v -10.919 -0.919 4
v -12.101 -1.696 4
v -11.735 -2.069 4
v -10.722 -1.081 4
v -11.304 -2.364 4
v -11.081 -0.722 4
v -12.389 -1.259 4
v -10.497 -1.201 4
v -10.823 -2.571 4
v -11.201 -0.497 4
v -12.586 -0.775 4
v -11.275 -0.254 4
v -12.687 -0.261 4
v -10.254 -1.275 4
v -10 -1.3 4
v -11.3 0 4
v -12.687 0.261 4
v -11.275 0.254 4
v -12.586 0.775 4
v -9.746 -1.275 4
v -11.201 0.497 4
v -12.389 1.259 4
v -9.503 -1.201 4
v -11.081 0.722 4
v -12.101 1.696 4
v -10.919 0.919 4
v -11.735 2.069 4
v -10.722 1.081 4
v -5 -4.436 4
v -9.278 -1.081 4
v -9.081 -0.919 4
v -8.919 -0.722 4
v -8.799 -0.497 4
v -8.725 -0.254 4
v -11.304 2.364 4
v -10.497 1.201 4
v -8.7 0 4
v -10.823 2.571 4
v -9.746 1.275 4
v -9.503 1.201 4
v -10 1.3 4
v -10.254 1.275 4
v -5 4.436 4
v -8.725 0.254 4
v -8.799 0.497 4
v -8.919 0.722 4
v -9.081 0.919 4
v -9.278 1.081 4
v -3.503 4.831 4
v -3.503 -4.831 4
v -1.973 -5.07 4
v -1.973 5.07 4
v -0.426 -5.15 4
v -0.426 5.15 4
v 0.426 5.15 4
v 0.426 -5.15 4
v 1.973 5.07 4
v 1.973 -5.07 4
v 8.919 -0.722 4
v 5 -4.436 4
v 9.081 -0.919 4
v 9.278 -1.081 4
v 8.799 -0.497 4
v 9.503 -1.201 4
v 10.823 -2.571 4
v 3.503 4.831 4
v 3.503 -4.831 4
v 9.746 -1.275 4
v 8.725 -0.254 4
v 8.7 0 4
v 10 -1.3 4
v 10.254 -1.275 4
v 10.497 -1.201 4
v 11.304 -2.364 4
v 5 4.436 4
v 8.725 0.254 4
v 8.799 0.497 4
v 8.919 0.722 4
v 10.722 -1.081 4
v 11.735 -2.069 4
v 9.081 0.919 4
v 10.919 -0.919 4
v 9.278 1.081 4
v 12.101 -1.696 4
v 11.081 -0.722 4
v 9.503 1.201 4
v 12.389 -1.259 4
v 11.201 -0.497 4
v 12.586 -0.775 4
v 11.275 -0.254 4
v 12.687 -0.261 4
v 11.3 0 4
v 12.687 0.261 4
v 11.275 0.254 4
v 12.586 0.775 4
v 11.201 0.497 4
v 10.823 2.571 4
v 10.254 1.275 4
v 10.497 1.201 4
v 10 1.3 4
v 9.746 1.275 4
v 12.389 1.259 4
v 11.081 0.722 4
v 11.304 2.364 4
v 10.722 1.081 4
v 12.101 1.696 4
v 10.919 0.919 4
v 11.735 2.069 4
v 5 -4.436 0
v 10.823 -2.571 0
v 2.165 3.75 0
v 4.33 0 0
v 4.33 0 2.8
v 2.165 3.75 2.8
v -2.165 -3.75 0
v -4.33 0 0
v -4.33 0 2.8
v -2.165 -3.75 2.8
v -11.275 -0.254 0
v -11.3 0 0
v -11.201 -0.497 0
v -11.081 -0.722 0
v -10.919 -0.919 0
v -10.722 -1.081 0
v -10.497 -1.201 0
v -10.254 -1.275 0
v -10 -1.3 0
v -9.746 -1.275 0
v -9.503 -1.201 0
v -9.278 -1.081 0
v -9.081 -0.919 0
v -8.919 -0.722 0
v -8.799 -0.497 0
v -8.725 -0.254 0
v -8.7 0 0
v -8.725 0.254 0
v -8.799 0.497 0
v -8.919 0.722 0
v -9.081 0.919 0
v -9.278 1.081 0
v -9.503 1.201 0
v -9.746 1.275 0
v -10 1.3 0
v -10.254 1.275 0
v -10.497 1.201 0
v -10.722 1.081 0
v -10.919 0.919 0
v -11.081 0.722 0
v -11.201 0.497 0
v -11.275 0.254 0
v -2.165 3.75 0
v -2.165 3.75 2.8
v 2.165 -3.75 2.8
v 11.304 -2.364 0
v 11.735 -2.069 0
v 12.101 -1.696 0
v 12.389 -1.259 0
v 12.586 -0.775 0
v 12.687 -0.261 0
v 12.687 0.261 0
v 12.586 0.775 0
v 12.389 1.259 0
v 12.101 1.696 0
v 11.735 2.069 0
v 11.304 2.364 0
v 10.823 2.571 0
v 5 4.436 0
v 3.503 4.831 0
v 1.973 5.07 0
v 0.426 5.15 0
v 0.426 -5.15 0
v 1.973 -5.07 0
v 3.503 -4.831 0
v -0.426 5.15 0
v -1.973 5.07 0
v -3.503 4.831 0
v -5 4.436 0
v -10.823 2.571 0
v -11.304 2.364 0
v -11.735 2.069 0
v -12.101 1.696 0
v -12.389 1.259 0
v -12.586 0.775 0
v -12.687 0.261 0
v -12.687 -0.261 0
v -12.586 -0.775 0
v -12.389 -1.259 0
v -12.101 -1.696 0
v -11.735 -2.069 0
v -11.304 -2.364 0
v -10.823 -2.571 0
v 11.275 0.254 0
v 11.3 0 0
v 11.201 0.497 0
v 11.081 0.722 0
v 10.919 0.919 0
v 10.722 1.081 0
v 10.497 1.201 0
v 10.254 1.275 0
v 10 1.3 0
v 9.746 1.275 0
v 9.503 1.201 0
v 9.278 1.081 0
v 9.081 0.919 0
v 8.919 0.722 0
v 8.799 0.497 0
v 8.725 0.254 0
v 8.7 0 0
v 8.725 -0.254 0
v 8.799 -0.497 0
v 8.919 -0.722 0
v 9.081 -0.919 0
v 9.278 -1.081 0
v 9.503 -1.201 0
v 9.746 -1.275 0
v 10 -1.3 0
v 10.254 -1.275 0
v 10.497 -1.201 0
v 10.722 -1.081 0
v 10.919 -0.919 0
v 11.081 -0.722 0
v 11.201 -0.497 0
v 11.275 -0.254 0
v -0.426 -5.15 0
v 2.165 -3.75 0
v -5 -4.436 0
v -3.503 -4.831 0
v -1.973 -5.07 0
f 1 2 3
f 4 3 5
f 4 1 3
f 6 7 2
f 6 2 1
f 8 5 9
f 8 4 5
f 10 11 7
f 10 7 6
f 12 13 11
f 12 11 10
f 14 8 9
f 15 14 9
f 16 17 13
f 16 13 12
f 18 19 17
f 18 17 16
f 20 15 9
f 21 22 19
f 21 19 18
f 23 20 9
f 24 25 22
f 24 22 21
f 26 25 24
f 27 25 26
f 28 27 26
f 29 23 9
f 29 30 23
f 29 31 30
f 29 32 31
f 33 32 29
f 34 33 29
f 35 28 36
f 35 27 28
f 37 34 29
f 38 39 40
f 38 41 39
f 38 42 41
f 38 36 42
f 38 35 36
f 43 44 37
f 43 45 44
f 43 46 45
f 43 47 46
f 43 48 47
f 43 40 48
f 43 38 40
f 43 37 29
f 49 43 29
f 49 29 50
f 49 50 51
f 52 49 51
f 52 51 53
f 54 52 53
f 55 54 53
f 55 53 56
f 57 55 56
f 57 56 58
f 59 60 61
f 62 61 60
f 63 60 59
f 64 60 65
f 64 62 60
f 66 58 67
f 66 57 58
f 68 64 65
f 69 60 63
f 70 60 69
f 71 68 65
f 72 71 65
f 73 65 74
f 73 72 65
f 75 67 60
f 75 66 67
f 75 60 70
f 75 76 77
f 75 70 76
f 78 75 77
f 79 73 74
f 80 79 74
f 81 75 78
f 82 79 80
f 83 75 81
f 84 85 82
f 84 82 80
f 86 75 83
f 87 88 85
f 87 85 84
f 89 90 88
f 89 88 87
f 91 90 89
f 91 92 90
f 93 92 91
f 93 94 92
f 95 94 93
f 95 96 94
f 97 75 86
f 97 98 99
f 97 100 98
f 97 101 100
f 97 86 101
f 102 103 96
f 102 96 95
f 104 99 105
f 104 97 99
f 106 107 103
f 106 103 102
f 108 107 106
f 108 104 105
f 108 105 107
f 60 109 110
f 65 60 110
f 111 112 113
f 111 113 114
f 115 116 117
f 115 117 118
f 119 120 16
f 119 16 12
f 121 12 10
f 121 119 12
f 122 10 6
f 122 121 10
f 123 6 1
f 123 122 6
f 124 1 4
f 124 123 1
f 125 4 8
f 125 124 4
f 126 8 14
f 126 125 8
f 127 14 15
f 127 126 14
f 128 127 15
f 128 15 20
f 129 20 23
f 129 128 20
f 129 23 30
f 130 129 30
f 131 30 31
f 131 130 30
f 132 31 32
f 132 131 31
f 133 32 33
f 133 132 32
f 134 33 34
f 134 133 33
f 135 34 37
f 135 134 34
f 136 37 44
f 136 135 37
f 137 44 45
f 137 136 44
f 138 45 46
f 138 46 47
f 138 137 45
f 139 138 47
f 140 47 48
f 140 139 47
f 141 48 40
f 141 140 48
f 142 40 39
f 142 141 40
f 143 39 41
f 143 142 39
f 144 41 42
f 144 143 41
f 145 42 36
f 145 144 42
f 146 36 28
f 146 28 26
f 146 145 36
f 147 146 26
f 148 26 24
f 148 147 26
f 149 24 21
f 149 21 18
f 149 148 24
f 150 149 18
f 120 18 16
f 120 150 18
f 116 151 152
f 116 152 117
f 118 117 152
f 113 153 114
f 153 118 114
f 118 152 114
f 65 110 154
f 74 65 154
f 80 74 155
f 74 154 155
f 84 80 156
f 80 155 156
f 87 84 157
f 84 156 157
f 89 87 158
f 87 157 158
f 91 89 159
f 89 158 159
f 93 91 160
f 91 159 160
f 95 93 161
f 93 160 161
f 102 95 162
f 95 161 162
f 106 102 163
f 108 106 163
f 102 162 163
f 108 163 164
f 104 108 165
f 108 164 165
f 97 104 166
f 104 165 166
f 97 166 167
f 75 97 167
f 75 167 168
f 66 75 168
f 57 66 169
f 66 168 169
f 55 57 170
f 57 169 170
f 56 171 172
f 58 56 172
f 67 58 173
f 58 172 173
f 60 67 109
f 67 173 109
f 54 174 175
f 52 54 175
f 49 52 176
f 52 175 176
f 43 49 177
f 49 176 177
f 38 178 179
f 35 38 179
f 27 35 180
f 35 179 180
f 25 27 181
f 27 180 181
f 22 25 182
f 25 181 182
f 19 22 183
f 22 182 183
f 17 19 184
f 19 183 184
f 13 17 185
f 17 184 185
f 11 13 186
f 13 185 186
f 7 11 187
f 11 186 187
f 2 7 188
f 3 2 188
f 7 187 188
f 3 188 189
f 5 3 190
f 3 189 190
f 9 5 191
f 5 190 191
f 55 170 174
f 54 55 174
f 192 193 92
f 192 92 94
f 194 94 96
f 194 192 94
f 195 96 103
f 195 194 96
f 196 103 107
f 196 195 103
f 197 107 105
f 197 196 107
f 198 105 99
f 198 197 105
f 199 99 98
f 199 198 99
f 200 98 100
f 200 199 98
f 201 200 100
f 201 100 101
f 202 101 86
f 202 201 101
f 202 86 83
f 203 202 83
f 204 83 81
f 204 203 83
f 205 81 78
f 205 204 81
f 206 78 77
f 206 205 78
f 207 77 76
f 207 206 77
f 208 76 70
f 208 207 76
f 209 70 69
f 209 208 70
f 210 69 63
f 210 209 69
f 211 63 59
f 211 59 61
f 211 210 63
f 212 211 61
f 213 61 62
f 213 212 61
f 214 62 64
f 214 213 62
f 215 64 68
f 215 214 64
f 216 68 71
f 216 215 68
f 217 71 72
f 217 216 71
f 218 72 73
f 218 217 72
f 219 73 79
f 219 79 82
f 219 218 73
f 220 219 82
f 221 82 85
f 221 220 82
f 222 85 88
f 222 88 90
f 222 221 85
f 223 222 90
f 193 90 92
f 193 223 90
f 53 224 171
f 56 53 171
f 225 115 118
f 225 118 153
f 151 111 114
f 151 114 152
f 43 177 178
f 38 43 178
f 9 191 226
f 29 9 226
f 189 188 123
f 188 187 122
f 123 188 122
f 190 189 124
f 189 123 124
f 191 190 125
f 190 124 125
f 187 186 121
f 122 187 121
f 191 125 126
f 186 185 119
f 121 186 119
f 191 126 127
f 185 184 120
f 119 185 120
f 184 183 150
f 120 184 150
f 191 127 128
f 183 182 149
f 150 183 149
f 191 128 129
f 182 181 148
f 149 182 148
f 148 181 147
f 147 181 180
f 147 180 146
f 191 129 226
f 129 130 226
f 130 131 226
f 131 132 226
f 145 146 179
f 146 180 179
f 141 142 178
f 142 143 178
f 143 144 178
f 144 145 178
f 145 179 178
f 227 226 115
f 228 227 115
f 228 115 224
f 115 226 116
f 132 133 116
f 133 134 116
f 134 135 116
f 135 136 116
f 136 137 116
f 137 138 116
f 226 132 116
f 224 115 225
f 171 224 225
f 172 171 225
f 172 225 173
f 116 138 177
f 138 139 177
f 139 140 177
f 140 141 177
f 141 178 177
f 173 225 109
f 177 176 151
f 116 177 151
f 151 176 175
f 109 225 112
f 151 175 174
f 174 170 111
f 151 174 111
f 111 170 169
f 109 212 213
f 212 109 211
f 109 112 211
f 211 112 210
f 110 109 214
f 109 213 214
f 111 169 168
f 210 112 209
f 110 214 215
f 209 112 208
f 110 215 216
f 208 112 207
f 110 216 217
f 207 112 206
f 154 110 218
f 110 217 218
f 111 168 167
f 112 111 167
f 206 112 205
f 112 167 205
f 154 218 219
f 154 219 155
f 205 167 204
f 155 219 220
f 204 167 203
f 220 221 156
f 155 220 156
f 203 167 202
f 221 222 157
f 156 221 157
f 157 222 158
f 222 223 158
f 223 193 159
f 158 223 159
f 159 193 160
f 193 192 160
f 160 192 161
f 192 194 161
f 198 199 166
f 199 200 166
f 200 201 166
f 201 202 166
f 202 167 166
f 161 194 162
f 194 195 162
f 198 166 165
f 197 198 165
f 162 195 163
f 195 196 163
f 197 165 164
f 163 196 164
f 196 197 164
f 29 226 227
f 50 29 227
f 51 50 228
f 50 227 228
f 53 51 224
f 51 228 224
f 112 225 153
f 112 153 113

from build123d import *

# Parameters (mm, degrees)
SKETCH1_R           = 1.3
BOSS_EXTRUDE1_DEPTH = 4
SKETCH2_R           = 4.330127019
BOSS_EXTRUDE2_DEPTH = 1.2


with BuildPart() as part:
    # Sketch1 → Boss-Extrude1 (new body)
    with BuildSketch(Plane.XY):
        with BuildLine():
            Line((10.823243212, 2.571433572), (5, 4.435742065))
            ThreePointArc((5, 4.435742065), (2.74093184, 4.97035983), (0.426426599, 5.15))
            Line((0.426426599, 5.15), (-0.426426599, 5.15))
            ThreePointArc((-0.426426599, 5.15), (-2.74093184, 4.97035983), (-5, 4.435742065))
            Line((-5, 4.435742065), (-10.823243212, 2.571433572))
            ThreePointArc((-10.823243212, 2.571433572), (-12.7, 0), (-10.823243212, -2.571433572))
            Line((-10.823243212, -2.571433572), (-5, -4.435742065))
            ThreePointArc((-5, -4.435742065), (-2.74093184, -4.97035983), (-0.426426599, -5.15))
            Line((-0.426426599, -5.15), (0.426426599, -5.15))
            ThreePointArc((0.426426599, -5.15), (2.74093184, -4.97035983), (5, -4.435742065))
            Line((5, -4.435742065), (10.823243212, -2.571433572))
            ThreePointArc((10.823243212, -2.571433572), (12.7, 0), (10.823243212, 2.571433572))
        make_face()
        with Locations((10, 0)):
            Circle(SKETCH1_R, mode=Mode.SUBTRACT)
        with Locations(Location((-10, 0, 0), (0, 0, 180))):
            Circle(SKETCH1_R, mode=Mode.SUBTRACT)
        Polygon((2.165063509, 3.75), (-2.165063509, 3.75), (-4.330127019, 0), (-2.165063509, -3.75), (2.165063509, -3.75), (4.330127019, 0), align=None, mode=Mode.SUBTRACT)
    extrude(amount=BOSS_EXTRUDE1_DEPTH)

    # Sketch2 → Boss-Extrude2 (add)
    with BuildSketch(Plane.XY.offset(4)):
        Circle(SKETCH2_R)
    extrude(amount=-BOSS_EXTRUDE2_DEPTH)


solid = part.part
